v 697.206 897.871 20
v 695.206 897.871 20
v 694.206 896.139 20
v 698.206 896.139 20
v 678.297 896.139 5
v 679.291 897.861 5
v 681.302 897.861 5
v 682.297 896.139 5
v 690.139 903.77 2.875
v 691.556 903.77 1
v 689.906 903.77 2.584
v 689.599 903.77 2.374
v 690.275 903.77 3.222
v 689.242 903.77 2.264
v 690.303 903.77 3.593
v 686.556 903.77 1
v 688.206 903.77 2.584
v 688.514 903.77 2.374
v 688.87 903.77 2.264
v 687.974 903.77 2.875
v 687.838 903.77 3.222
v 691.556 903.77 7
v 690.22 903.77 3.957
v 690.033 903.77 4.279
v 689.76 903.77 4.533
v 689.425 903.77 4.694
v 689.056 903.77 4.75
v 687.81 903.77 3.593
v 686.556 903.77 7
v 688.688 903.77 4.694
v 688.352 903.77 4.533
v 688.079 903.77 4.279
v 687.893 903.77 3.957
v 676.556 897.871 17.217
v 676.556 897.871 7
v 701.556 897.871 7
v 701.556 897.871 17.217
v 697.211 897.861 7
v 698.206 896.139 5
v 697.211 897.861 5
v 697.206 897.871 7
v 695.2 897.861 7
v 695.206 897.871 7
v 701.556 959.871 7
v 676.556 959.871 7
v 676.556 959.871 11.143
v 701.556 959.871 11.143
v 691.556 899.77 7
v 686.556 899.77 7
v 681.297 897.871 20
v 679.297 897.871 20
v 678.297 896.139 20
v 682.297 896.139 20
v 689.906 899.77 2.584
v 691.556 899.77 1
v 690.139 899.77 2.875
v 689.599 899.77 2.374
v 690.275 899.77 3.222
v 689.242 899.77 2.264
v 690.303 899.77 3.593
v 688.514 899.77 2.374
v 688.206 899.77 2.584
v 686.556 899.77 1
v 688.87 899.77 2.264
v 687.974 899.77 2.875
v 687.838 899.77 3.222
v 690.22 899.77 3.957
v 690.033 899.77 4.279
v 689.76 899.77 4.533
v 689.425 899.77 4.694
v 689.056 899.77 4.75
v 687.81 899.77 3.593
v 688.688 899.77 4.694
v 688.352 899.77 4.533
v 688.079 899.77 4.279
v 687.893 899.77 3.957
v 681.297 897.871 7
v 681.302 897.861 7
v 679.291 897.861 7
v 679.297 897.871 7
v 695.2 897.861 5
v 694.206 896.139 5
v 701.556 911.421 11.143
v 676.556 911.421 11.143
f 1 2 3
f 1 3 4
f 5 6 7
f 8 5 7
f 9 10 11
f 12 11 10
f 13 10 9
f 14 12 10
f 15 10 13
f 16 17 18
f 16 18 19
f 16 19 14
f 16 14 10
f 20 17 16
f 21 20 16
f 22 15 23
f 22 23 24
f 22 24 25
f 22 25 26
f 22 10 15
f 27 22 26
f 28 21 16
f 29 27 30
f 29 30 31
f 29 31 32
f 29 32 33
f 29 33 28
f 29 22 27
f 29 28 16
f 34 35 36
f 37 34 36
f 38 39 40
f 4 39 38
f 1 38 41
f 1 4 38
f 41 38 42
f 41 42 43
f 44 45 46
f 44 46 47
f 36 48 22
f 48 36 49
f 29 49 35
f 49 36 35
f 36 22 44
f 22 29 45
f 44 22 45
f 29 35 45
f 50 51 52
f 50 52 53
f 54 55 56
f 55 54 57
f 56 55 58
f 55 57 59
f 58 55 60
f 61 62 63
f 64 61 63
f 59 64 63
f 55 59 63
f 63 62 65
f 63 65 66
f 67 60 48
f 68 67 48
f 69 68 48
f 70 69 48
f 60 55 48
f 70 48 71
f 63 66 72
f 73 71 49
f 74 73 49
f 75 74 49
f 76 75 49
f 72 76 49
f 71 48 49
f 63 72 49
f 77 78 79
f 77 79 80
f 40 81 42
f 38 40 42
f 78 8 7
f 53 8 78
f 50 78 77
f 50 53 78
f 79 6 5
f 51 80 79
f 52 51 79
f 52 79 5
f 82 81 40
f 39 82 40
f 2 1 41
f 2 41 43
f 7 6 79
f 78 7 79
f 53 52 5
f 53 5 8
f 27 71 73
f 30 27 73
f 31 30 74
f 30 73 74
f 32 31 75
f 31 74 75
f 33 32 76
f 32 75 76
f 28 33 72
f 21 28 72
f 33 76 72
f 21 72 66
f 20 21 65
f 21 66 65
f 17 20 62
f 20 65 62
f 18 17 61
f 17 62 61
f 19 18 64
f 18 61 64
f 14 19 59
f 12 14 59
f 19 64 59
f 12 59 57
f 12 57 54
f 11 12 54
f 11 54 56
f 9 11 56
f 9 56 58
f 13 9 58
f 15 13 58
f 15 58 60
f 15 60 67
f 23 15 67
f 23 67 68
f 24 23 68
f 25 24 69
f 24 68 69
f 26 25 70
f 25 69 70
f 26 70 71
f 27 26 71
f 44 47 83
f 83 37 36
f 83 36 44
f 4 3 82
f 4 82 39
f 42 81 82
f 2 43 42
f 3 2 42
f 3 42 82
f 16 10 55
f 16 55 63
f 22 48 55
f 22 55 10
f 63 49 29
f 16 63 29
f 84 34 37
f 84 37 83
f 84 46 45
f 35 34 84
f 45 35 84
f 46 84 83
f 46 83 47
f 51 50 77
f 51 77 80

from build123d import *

# Parameters (mm, degrees)
SKETCH1_W             = 25
SKETCH1_H             = 2
BOSS_EXTRUDE1_DEPTH   = 20
BOSS_EXTRUDE2_DEPTH   = 15
BOSS_EXTRUDE2_2_DEPTH = 15
SKETCH4_W             = 25
SKETCH4_H             = 13
BOSS_EXTRUDE3_DEPTH   = 60
CUT_EXTRUDE1_DEPTH    = 25
SKETCH6_W             = 7
SKETCH6_H             = 2.009284039
CUT_EXTRUDE3_DEPTH    = 25
SKETCH8_W             = 5
SKETCH8_H             = 4
BOSS_EXTRUDE5_DEPTH   = 6
SKETCH11_W            = 1.25
SKETCH11_H            = 7.630869725


with BuildPart() as part:
    # Sketch1 → Boss-Extrude1 (new body)
    with BuildSketch(Plane.XY):
        with Locations((689.05616553, 898.870768954)):
            Rectangle(SKETCH1_W, SKETCH1_H)
    extrude(amount=BOSS_EXTRUDE1_DEPTH)

    # Sketch4 → Boss-Extrude3 (add)
    with BuildSketch(Plane(origin=(0, 899.870768954, 0), x_dir=(1, 0, 0), z_dir=(0, 1, 0))):
        with Locations((689.05616553, -13.5)):
            Rectangle(SKETCH4_W, SKETCH4_H)
    extrude(amount=BOSS_EXTRUDE3_DEPTH)

    # Sketch5 → Cut-Extrude1 (cut)
    with BuildSketch(Plane.ZY.offset(-676.55616553)):
        Polygon((11.143111538, 959.870768954), (20, 959.870768954), (20, 897.870768954), (17.217418277, 897.870768954), (11.143111538, 911.420968004), align=None)
    extrude(amount=-CUT_EXTRUDE1_DEPTH, mode=Mode.SUBTRACT)


with BuildPart() as body_2:
    # Sketch2 → Boss-Extrude2 (new body)
    with BuildSketch(Plane.XY.offset(20)):
        Polygon((679.296852935, 897.870768954), (678.296852935, 896.138718147), (682.296852935, 896.138718147), (681.296852935, 897.870768954), align=None)
    extrude(amount=-BOSS_EXTRUDE2_DEPTH)


with BuildPart() as body_3:
    # Sketch2 → Boss-Extrude2 2 (new body)
    with BuildSketch(Plane.XY.offset(20)):
        Polygon((697.20561018, 897.870768954), (695.20561018, 897.870768954), (694.20561018, 896.138718147), (698.20561018, 896.138718147), align=None)
    extrude(amount=-BOSS_EXTRUDE2_2_DEPTH)


with BuildPart() as cut_extrude3_tool:
    # Sketch6 → Cut-Extrude3 (new body)
    with BuildSketch(Plane.ZY.offset(-676.55616553)):
        with Locations((3.5, 898.866126935)):
            Rectangle(SKETCH6_W, SKETCH6_H)
    extrude(amount=-CUT_EXTRUDE3_DEPTH)


with BuildPart() as part_1:
    add(part.part)

    # Cut-Extrude3: cut by cut_extrude3_tool
    add(cut_extrude3_tool.part, mode=Mode.SUBTRACT)

    # Sketch8 → Boss-Extrude5 (add)
    with BuildSketch(Plane(origin=(0, 0, 7), x_dir=(-1, 0, 0), z_dir=(0, 0, -1))):
        with Locations((-689.05616553, 901.769587872)):
            Rectangle(SKETCH8_W, SKETCH8_H)
    extrude(amount=BOSS_EXTRUDE5_DEPTH)

    # Sketch11 → Ø2.5 (2.5) Diameter Hole1 (revolve, cut)
    with BuildSketch(Plane(origin=(689.05616553, 903.769587872, 3.5), x_dir=(0, 0, 1), z_dir=(1, 0, 0))):
        with Locations((0.625, 3.815434863)):
            Rectangle(SKETCH11_W, SKETCH11_H)
    revolve(axis=Axis((689.05616553, 910.119587872, 3.5), (0, -1, 0)), mode=Mode.SUBTRACT)


with BuildPart() as body_2_1:
    add(body_2.part)

    # Cut-Extrude3: cut by cut_extrude3_tool
    add(cut_extrude3_tool.part, mode=Mode.SUBTRACT)


with BuildPart() as body_3_1:
    add(body_3.part)

    # Cut-Extrude3: cut by cut_extrude3_tool
    add(cut_extrude3_tool.part, mode=Mode.SUBTRACT)


solid = Compound([part_1.part, body_2_1.part, body_3_1.part])
